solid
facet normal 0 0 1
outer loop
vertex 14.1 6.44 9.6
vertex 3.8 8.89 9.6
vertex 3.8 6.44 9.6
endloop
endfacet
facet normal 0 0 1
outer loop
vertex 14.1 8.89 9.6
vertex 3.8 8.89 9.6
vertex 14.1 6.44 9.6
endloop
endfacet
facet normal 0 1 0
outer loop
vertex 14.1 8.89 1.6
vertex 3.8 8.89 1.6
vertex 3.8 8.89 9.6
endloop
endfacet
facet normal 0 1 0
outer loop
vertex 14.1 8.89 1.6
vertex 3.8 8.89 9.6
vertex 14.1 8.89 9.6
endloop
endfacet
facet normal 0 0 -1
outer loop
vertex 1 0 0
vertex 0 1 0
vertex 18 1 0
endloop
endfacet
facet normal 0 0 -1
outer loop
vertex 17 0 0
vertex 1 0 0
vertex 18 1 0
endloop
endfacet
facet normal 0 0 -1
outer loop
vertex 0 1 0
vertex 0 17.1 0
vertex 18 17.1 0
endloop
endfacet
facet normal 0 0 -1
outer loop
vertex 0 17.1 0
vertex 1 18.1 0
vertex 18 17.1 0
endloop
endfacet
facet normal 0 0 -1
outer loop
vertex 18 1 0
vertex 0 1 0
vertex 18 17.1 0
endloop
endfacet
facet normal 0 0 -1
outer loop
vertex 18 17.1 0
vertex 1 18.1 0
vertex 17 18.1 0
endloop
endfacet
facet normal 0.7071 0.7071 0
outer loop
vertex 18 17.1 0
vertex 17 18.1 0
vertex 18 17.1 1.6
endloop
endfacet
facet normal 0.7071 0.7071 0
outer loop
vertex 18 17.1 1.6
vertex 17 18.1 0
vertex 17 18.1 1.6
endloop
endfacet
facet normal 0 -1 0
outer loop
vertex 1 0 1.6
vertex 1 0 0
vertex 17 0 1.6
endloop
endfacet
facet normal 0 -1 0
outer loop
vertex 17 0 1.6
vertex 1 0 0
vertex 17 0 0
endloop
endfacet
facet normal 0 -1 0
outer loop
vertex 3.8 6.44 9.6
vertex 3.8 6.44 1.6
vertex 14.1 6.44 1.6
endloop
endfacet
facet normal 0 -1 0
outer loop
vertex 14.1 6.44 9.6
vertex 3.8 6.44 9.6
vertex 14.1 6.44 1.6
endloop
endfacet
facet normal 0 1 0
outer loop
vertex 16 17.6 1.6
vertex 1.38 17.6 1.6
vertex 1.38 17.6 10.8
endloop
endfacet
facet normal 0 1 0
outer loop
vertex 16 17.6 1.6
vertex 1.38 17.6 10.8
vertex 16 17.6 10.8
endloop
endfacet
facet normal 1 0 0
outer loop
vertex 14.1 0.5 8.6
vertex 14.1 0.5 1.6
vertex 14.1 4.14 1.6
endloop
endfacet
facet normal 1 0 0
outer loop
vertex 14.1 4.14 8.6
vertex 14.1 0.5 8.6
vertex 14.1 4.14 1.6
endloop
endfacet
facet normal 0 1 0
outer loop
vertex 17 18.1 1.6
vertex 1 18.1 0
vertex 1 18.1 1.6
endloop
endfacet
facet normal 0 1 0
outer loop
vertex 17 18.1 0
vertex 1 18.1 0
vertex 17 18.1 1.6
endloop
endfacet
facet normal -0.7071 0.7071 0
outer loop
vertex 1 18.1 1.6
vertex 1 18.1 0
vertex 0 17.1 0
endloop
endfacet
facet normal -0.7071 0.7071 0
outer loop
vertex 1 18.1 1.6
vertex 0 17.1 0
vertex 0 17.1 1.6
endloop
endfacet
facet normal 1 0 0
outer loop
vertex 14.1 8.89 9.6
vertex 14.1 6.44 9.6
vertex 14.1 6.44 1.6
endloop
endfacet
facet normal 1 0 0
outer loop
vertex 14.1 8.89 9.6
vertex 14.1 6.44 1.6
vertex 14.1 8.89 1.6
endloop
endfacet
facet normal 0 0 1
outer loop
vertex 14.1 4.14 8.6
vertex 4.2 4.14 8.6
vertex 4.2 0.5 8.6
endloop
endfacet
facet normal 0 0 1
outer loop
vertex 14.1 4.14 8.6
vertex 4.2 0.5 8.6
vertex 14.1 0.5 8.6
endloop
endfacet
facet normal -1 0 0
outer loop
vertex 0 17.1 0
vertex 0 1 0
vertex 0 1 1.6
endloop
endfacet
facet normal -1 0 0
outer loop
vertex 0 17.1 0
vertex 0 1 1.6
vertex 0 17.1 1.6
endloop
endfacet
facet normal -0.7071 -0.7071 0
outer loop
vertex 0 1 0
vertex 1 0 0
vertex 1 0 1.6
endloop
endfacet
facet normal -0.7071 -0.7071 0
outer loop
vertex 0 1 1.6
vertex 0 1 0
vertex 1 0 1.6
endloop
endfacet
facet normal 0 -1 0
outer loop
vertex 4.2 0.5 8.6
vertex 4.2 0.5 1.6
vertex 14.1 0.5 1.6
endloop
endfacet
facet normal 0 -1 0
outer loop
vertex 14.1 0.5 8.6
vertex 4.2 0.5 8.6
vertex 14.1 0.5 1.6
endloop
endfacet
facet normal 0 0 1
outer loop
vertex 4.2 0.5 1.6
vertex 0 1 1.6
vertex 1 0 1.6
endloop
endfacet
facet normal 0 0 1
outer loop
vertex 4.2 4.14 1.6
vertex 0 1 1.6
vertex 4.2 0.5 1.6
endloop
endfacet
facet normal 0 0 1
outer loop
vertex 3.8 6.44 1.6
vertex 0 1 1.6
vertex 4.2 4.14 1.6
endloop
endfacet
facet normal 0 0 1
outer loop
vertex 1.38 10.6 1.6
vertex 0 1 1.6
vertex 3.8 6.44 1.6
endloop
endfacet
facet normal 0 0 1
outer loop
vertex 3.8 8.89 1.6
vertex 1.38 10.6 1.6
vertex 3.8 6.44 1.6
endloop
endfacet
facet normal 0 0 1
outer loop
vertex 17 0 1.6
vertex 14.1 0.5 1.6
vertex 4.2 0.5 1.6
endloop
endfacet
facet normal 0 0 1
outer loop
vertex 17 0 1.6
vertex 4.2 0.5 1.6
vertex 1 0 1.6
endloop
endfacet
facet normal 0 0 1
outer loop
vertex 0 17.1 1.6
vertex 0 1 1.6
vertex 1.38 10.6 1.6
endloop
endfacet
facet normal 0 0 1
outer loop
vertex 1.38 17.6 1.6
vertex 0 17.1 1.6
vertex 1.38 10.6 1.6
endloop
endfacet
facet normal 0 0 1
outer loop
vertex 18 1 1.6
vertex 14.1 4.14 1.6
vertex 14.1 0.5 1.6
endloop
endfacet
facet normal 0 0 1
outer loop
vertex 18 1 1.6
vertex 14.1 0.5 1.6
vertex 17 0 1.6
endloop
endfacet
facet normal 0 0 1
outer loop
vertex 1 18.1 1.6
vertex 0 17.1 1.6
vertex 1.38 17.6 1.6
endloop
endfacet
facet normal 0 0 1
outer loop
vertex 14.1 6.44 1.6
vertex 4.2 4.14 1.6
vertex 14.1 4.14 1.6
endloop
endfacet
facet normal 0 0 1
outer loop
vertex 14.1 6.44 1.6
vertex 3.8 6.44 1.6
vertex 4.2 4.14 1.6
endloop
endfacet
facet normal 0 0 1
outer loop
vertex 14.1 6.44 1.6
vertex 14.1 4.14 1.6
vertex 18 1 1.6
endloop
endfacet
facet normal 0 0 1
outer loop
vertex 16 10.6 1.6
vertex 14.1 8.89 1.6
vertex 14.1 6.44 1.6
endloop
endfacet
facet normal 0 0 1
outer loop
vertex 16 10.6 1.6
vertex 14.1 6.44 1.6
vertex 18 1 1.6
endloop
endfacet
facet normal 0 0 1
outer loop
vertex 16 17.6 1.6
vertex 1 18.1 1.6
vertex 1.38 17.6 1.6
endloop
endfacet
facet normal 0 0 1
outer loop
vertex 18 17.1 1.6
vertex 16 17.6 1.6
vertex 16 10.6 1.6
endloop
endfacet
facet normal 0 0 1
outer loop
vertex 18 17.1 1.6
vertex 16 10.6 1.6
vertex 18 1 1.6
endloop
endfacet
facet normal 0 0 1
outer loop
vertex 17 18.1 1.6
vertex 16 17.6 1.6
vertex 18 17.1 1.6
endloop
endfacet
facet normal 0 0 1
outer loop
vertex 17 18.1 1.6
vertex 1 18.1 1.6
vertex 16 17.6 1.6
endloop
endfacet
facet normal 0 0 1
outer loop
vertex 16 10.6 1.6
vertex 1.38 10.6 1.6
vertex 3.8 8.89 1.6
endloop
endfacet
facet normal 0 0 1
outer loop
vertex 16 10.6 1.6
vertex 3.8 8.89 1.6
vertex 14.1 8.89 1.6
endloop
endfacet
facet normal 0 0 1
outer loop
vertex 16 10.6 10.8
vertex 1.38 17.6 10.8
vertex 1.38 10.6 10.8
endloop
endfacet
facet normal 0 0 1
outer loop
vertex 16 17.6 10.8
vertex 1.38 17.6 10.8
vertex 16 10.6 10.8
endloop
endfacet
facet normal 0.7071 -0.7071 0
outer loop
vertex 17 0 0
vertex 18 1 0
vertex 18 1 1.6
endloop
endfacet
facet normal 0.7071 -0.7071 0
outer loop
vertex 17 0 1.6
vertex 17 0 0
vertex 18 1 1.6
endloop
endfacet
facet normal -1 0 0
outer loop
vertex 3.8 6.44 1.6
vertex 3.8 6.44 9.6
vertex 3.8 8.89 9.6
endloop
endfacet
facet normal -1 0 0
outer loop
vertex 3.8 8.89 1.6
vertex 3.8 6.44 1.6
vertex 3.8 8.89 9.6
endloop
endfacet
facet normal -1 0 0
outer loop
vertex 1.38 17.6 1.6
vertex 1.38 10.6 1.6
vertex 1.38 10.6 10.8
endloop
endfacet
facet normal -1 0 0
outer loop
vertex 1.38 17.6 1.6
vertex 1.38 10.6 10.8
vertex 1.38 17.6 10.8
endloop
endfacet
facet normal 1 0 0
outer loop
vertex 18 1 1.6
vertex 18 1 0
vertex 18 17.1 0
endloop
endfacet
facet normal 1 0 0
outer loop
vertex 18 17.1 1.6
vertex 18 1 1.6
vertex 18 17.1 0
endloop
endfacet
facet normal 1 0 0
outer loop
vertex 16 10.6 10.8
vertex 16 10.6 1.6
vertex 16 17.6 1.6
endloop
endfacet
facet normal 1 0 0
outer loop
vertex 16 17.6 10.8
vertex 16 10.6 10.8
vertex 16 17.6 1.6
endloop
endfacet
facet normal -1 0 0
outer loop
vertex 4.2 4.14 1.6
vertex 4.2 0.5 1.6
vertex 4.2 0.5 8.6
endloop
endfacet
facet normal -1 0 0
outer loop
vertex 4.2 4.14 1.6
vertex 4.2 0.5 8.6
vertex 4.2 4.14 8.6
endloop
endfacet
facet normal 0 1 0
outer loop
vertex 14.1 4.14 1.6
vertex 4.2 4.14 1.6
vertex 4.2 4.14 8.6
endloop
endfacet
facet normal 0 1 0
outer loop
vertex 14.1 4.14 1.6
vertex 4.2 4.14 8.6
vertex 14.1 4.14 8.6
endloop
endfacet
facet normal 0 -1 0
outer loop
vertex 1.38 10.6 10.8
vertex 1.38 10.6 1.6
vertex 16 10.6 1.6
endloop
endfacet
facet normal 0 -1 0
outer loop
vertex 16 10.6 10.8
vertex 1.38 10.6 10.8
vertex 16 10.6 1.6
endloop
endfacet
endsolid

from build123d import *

# Parameters (mm, degrees)
SKETCH1_W           = 18
SKETCH1_H           = 18.1
BOSS_EXTRUDE1_DEPTH = 1.6
CHAMFER1_SIZE       = 1
SKETCH2_W           = 9.9
SKETCH2_H           = 3.64
BOSS_EXTRUDE2_DEPTH = 7
SKETCH3_W           = 10.3
SKETCH3_H           = 2.45
BOSS_EXTRUDE3_DEPTH = 8
SKETCH4_W           = 14.62
SKETCH4_H           = 7
BOSS_EXTRUDE4_DEPTH = 9.2


with BuildPart() as part:
    # Sketch1 → Boss-Extrude1 (new body)
    with BuildSketch(Plane.XY):
        with Locations((9, 9.05)):
            Rectangle(SKETCH1_W, SKETCH1_H)
    extrude(amount=BOSS_EXTRUDE1_DEPTH)

    # Chamfer1
    chamfer1_edges = [part.edges().sort_by_distance(p)[0] for p in [
        (0, 18.1, 0.8),
        (18, 18.1, 0.8),
        (18, 0, 0.8),
        (0, 0, 0.8),
    ]]
    chamfer(chamfer1_edges, length=CHAMFER1_SIZE)

    # Sketch2 → Boss-Extrude2 (add)
    with BuildSketch(Plane.XY.offset(1.6)):
        with Locations((9.15, 2.32)):
            Rectangle(SKETCH2_W, SKETCH2_H)
    extrude(amount=BOSS_EXTRUDE2_DEPTH)

    # Sketch3 → Boss-Extrude3 (add)
    with BuildSketch(Plane.XY.offset(1.6)):
        with Locations((8.95, 7.665)):
            Rectangle(SKETCH3_W, SKETCH3_H)
    extrude(amount=BOSS_EXTRUDE3_DEPTH)

    # Sketch4 → Boss-Extrude4 (add)
    with BuildSketch(Plane.XY.offset(1.6)):
        with Locations((8.69, 14.1)):
            Rectangle(SKETCH4_W, SKETCH4_H)
    extrude(amount=BOSS_EXTRUDE4_DEPTH)


solid = part.part
